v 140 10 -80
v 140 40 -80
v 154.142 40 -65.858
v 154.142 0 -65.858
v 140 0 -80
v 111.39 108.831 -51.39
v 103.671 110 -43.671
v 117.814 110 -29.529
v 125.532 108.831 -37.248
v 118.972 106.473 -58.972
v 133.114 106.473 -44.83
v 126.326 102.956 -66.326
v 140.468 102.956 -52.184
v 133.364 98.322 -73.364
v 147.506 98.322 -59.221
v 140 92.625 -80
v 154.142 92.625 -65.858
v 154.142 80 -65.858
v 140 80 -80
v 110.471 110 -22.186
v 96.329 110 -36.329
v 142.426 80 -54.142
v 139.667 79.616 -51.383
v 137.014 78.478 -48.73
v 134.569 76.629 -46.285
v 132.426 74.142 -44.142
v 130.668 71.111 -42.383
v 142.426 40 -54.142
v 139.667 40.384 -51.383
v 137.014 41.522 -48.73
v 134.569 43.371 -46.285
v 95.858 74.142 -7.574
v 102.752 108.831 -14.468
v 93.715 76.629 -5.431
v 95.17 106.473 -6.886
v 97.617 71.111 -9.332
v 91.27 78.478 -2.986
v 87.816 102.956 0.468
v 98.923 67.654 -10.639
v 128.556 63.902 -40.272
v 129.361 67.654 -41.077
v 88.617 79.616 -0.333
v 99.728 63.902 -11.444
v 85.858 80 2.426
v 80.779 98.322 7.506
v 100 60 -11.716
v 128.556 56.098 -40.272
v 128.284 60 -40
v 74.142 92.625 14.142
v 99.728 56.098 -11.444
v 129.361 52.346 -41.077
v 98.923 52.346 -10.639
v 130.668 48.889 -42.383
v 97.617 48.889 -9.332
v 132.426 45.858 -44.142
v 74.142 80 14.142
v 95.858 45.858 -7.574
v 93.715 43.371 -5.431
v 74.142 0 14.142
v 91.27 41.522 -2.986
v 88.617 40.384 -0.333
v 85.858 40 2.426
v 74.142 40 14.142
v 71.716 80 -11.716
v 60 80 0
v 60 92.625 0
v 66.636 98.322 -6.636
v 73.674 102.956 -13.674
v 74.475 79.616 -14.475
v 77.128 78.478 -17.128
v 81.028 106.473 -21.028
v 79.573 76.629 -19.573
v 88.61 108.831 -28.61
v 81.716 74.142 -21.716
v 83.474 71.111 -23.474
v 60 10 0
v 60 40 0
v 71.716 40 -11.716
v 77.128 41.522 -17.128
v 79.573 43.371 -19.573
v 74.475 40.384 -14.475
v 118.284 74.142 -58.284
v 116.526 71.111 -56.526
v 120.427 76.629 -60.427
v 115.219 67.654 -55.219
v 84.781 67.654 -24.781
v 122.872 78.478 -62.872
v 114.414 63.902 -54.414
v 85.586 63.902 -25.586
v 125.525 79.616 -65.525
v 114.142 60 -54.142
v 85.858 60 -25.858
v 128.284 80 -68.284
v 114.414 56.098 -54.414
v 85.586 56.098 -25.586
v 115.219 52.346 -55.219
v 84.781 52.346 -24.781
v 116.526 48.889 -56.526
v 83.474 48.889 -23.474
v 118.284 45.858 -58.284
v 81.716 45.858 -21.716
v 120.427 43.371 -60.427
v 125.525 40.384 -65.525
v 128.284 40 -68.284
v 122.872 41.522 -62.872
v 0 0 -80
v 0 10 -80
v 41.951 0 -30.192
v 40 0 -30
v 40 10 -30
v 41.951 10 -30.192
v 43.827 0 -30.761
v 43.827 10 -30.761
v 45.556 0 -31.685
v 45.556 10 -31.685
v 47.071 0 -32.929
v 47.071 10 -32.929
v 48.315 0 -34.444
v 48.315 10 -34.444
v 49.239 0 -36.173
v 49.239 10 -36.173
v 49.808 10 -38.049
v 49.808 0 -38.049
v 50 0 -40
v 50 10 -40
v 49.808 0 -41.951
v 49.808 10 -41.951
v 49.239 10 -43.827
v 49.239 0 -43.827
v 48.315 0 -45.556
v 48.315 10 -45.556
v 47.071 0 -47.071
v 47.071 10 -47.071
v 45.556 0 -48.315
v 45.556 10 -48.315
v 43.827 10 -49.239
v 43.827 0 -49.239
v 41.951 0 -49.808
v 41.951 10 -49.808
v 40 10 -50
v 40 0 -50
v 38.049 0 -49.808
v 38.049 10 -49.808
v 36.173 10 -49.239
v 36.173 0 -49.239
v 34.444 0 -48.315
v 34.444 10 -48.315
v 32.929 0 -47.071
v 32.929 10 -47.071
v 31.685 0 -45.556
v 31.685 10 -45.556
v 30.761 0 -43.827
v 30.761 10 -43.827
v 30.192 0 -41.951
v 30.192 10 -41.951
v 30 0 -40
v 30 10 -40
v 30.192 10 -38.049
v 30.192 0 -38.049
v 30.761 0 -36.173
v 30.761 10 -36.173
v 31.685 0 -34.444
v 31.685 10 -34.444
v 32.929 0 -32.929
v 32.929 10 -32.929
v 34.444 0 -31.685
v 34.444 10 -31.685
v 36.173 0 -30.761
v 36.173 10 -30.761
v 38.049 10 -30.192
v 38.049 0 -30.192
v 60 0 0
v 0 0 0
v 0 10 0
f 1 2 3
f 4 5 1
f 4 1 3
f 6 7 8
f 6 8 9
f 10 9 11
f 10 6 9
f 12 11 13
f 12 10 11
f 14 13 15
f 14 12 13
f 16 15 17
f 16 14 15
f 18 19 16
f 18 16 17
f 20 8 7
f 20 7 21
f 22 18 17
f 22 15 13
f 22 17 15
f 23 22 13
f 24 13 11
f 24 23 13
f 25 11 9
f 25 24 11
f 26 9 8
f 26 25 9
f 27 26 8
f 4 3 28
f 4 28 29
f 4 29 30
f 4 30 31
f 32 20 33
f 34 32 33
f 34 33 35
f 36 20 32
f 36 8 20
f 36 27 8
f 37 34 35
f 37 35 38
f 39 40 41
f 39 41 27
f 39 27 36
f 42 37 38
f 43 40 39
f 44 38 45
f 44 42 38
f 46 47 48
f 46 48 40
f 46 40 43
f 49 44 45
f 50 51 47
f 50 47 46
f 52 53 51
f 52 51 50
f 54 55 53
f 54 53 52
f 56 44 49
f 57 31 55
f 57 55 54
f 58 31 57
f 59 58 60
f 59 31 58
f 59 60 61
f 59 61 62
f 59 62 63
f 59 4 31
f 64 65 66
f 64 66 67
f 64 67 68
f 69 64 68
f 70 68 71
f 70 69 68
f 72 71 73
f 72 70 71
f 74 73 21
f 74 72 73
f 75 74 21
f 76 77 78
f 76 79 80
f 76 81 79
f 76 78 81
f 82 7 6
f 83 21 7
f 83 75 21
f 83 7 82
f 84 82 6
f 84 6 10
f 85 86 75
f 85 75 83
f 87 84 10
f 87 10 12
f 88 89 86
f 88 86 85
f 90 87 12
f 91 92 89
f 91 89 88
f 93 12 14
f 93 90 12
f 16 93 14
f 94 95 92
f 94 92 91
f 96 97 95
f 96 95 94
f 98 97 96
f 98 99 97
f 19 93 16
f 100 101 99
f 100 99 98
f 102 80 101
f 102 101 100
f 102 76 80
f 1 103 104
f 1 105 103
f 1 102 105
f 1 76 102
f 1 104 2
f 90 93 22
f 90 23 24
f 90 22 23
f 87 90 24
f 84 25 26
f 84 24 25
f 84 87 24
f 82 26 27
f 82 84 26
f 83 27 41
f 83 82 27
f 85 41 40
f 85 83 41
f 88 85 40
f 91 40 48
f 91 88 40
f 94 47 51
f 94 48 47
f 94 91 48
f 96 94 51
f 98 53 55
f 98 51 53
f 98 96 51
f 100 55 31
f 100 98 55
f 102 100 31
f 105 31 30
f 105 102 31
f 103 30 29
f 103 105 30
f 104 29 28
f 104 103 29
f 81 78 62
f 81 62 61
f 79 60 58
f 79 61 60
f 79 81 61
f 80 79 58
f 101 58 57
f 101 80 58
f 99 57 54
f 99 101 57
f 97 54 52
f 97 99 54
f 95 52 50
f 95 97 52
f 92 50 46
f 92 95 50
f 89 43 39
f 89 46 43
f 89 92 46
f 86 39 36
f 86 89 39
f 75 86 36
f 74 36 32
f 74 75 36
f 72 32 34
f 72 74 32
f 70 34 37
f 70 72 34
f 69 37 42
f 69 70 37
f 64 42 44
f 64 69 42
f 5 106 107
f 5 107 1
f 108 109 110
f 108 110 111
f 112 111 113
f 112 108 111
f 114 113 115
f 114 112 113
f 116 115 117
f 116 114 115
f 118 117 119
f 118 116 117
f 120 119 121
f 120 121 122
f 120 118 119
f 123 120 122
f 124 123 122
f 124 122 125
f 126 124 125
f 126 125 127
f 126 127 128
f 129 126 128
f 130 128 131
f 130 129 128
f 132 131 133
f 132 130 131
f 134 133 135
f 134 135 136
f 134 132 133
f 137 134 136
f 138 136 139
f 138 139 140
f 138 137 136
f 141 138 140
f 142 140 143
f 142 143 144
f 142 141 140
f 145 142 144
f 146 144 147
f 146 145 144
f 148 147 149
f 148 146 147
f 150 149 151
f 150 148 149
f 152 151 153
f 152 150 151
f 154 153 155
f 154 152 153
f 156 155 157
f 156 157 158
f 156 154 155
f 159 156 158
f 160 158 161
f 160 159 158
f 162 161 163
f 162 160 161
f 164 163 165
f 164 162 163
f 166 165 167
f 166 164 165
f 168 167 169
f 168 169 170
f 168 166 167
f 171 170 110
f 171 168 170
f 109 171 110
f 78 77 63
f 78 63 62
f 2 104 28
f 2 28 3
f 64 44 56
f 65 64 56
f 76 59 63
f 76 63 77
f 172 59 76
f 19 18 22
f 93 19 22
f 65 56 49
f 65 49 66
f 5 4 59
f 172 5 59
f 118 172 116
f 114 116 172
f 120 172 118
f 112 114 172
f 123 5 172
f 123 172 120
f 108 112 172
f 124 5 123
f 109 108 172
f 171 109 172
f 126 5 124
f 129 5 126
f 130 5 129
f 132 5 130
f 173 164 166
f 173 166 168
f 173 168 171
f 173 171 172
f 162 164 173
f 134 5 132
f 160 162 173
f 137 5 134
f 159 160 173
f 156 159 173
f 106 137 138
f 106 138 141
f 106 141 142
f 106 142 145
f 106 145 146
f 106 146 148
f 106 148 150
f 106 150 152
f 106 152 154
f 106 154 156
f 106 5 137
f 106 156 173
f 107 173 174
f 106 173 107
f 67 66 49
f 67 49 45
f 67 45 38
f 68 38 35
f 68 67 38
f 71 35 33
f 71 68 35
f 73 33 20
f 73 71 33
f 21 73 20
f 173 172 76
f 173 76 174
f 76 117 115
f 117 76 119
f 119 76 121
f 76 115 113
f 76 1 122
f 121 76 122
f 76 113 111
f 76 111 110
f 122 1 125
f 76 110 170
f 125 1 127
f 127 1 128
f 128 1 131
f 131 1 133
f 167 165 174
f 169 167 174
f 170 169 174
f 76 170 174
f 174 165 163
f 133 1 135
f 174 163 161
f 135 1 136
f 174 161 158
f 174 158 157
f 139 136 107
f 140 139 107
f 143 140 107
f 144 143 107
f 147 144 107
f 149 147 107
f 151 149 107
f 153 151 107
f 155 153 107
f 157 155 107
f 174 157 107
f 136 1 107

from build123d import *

# Parameters (mm, degrees)
SKETCH1_R               = 10
BOSS_EXTRUDE1_DEPTH     = 10
BOSS_EXTRUDE2_DEPTH     = 110
CUT_EXTRUDE2_DEPTH      = 200.025801938
CUT_EXTRUDE2_DEPTH_BACK = 110


with BuildPart() as part:
    # Sketch1 → Boss-Extrude1 (new body)
    with BuildSketch(Plane(origin=(0, 0, 0), x_dir=(1, 0, 0), z_dir=(0, 1, 0))):
        Polygon((0, 80), (0, 0), (60, 0), (140, 80), align=None)
        with Locations((40, 40)):
            Circle(SKETCH1_R, mode=Mode.SUBTRACT)
    extrude(amount=BOSS_EXTRUDE1_DEPTH)

    # Sketch1<3> → Boss-Extrude2 (add)
    with BuildSketch(Plane(origin=(0, 0, 0), x_dir=(1, 0, 0), z_dir=(0, 1, 0))):
        Polygon((140, 80), (60, 0), (74.142135624, -14.142135624), (154.142135624, 65.857864376), align=None)
    extrude(amount=BOSS_EXTRUDE2_DEPTH)

    # Sketch2 → Cut-Extrude2 (cut, two sides: drawn at the far end of the back side and taken through both)
    with BuildSketch(Plane(origin=(44.142135624, 0, 44.142135624), x_dir=(0.7071067811865461, 0, -0.707106781186549), z_dir=(0.707106781186549, 0, 0.7071067811865461)).offset(-CUT_EXTRUDE2_DEPTH_BACK)):
        with BuildLine():
            Line((58.994949366, 80), (42.426406871, 80))
            Line((42.426406871, 80), (42.426406871, 40))
            Line((42.426406871, 40), (58.994949366, 40))
            ThreePointArc((58.994949366, 40), (78.994949366, 60), (58.994949366, 80))
        make_face()
        with BuildLine():
            Line((42.426406871, 110), (42.426406871, 92.625413423))
            ThreePointArc((42.426406871, 92.625413423), (66.915884537, 104.857221881), (93.802749132, 110))
            Line((93.802749132, 110), (42.426406871, 110))
        make_face()
        with BuildLine():
            Line((155.563491861, 40), (155.563491861, 80))
            Line((155.563491861, 80), (138.994949366, 80))
            ThreePointArc((138.994949366, 80), (118.994949366, 60), (138.994949366, 40))
            Line((138.994949366, 40), (155.563491861, 40))
        make_face()
        with BuildLine():
            Line((155.563491861, 110), (104.1871496, 110))
            ThreePointArc((104.1871496, 110), (131.074014195, 104.857221881), (155.563491861, 92.625413423))
            Line((155.563491861, 92.625413423), (155.563491861, 110))
        make_face()
    extrude(amount=CUT_EXTRUDE2_DEPTH + CUT_EXTRUDE2_DEPTH_BACK, mode=Mode.SUBTRACT)


solid = part.part
